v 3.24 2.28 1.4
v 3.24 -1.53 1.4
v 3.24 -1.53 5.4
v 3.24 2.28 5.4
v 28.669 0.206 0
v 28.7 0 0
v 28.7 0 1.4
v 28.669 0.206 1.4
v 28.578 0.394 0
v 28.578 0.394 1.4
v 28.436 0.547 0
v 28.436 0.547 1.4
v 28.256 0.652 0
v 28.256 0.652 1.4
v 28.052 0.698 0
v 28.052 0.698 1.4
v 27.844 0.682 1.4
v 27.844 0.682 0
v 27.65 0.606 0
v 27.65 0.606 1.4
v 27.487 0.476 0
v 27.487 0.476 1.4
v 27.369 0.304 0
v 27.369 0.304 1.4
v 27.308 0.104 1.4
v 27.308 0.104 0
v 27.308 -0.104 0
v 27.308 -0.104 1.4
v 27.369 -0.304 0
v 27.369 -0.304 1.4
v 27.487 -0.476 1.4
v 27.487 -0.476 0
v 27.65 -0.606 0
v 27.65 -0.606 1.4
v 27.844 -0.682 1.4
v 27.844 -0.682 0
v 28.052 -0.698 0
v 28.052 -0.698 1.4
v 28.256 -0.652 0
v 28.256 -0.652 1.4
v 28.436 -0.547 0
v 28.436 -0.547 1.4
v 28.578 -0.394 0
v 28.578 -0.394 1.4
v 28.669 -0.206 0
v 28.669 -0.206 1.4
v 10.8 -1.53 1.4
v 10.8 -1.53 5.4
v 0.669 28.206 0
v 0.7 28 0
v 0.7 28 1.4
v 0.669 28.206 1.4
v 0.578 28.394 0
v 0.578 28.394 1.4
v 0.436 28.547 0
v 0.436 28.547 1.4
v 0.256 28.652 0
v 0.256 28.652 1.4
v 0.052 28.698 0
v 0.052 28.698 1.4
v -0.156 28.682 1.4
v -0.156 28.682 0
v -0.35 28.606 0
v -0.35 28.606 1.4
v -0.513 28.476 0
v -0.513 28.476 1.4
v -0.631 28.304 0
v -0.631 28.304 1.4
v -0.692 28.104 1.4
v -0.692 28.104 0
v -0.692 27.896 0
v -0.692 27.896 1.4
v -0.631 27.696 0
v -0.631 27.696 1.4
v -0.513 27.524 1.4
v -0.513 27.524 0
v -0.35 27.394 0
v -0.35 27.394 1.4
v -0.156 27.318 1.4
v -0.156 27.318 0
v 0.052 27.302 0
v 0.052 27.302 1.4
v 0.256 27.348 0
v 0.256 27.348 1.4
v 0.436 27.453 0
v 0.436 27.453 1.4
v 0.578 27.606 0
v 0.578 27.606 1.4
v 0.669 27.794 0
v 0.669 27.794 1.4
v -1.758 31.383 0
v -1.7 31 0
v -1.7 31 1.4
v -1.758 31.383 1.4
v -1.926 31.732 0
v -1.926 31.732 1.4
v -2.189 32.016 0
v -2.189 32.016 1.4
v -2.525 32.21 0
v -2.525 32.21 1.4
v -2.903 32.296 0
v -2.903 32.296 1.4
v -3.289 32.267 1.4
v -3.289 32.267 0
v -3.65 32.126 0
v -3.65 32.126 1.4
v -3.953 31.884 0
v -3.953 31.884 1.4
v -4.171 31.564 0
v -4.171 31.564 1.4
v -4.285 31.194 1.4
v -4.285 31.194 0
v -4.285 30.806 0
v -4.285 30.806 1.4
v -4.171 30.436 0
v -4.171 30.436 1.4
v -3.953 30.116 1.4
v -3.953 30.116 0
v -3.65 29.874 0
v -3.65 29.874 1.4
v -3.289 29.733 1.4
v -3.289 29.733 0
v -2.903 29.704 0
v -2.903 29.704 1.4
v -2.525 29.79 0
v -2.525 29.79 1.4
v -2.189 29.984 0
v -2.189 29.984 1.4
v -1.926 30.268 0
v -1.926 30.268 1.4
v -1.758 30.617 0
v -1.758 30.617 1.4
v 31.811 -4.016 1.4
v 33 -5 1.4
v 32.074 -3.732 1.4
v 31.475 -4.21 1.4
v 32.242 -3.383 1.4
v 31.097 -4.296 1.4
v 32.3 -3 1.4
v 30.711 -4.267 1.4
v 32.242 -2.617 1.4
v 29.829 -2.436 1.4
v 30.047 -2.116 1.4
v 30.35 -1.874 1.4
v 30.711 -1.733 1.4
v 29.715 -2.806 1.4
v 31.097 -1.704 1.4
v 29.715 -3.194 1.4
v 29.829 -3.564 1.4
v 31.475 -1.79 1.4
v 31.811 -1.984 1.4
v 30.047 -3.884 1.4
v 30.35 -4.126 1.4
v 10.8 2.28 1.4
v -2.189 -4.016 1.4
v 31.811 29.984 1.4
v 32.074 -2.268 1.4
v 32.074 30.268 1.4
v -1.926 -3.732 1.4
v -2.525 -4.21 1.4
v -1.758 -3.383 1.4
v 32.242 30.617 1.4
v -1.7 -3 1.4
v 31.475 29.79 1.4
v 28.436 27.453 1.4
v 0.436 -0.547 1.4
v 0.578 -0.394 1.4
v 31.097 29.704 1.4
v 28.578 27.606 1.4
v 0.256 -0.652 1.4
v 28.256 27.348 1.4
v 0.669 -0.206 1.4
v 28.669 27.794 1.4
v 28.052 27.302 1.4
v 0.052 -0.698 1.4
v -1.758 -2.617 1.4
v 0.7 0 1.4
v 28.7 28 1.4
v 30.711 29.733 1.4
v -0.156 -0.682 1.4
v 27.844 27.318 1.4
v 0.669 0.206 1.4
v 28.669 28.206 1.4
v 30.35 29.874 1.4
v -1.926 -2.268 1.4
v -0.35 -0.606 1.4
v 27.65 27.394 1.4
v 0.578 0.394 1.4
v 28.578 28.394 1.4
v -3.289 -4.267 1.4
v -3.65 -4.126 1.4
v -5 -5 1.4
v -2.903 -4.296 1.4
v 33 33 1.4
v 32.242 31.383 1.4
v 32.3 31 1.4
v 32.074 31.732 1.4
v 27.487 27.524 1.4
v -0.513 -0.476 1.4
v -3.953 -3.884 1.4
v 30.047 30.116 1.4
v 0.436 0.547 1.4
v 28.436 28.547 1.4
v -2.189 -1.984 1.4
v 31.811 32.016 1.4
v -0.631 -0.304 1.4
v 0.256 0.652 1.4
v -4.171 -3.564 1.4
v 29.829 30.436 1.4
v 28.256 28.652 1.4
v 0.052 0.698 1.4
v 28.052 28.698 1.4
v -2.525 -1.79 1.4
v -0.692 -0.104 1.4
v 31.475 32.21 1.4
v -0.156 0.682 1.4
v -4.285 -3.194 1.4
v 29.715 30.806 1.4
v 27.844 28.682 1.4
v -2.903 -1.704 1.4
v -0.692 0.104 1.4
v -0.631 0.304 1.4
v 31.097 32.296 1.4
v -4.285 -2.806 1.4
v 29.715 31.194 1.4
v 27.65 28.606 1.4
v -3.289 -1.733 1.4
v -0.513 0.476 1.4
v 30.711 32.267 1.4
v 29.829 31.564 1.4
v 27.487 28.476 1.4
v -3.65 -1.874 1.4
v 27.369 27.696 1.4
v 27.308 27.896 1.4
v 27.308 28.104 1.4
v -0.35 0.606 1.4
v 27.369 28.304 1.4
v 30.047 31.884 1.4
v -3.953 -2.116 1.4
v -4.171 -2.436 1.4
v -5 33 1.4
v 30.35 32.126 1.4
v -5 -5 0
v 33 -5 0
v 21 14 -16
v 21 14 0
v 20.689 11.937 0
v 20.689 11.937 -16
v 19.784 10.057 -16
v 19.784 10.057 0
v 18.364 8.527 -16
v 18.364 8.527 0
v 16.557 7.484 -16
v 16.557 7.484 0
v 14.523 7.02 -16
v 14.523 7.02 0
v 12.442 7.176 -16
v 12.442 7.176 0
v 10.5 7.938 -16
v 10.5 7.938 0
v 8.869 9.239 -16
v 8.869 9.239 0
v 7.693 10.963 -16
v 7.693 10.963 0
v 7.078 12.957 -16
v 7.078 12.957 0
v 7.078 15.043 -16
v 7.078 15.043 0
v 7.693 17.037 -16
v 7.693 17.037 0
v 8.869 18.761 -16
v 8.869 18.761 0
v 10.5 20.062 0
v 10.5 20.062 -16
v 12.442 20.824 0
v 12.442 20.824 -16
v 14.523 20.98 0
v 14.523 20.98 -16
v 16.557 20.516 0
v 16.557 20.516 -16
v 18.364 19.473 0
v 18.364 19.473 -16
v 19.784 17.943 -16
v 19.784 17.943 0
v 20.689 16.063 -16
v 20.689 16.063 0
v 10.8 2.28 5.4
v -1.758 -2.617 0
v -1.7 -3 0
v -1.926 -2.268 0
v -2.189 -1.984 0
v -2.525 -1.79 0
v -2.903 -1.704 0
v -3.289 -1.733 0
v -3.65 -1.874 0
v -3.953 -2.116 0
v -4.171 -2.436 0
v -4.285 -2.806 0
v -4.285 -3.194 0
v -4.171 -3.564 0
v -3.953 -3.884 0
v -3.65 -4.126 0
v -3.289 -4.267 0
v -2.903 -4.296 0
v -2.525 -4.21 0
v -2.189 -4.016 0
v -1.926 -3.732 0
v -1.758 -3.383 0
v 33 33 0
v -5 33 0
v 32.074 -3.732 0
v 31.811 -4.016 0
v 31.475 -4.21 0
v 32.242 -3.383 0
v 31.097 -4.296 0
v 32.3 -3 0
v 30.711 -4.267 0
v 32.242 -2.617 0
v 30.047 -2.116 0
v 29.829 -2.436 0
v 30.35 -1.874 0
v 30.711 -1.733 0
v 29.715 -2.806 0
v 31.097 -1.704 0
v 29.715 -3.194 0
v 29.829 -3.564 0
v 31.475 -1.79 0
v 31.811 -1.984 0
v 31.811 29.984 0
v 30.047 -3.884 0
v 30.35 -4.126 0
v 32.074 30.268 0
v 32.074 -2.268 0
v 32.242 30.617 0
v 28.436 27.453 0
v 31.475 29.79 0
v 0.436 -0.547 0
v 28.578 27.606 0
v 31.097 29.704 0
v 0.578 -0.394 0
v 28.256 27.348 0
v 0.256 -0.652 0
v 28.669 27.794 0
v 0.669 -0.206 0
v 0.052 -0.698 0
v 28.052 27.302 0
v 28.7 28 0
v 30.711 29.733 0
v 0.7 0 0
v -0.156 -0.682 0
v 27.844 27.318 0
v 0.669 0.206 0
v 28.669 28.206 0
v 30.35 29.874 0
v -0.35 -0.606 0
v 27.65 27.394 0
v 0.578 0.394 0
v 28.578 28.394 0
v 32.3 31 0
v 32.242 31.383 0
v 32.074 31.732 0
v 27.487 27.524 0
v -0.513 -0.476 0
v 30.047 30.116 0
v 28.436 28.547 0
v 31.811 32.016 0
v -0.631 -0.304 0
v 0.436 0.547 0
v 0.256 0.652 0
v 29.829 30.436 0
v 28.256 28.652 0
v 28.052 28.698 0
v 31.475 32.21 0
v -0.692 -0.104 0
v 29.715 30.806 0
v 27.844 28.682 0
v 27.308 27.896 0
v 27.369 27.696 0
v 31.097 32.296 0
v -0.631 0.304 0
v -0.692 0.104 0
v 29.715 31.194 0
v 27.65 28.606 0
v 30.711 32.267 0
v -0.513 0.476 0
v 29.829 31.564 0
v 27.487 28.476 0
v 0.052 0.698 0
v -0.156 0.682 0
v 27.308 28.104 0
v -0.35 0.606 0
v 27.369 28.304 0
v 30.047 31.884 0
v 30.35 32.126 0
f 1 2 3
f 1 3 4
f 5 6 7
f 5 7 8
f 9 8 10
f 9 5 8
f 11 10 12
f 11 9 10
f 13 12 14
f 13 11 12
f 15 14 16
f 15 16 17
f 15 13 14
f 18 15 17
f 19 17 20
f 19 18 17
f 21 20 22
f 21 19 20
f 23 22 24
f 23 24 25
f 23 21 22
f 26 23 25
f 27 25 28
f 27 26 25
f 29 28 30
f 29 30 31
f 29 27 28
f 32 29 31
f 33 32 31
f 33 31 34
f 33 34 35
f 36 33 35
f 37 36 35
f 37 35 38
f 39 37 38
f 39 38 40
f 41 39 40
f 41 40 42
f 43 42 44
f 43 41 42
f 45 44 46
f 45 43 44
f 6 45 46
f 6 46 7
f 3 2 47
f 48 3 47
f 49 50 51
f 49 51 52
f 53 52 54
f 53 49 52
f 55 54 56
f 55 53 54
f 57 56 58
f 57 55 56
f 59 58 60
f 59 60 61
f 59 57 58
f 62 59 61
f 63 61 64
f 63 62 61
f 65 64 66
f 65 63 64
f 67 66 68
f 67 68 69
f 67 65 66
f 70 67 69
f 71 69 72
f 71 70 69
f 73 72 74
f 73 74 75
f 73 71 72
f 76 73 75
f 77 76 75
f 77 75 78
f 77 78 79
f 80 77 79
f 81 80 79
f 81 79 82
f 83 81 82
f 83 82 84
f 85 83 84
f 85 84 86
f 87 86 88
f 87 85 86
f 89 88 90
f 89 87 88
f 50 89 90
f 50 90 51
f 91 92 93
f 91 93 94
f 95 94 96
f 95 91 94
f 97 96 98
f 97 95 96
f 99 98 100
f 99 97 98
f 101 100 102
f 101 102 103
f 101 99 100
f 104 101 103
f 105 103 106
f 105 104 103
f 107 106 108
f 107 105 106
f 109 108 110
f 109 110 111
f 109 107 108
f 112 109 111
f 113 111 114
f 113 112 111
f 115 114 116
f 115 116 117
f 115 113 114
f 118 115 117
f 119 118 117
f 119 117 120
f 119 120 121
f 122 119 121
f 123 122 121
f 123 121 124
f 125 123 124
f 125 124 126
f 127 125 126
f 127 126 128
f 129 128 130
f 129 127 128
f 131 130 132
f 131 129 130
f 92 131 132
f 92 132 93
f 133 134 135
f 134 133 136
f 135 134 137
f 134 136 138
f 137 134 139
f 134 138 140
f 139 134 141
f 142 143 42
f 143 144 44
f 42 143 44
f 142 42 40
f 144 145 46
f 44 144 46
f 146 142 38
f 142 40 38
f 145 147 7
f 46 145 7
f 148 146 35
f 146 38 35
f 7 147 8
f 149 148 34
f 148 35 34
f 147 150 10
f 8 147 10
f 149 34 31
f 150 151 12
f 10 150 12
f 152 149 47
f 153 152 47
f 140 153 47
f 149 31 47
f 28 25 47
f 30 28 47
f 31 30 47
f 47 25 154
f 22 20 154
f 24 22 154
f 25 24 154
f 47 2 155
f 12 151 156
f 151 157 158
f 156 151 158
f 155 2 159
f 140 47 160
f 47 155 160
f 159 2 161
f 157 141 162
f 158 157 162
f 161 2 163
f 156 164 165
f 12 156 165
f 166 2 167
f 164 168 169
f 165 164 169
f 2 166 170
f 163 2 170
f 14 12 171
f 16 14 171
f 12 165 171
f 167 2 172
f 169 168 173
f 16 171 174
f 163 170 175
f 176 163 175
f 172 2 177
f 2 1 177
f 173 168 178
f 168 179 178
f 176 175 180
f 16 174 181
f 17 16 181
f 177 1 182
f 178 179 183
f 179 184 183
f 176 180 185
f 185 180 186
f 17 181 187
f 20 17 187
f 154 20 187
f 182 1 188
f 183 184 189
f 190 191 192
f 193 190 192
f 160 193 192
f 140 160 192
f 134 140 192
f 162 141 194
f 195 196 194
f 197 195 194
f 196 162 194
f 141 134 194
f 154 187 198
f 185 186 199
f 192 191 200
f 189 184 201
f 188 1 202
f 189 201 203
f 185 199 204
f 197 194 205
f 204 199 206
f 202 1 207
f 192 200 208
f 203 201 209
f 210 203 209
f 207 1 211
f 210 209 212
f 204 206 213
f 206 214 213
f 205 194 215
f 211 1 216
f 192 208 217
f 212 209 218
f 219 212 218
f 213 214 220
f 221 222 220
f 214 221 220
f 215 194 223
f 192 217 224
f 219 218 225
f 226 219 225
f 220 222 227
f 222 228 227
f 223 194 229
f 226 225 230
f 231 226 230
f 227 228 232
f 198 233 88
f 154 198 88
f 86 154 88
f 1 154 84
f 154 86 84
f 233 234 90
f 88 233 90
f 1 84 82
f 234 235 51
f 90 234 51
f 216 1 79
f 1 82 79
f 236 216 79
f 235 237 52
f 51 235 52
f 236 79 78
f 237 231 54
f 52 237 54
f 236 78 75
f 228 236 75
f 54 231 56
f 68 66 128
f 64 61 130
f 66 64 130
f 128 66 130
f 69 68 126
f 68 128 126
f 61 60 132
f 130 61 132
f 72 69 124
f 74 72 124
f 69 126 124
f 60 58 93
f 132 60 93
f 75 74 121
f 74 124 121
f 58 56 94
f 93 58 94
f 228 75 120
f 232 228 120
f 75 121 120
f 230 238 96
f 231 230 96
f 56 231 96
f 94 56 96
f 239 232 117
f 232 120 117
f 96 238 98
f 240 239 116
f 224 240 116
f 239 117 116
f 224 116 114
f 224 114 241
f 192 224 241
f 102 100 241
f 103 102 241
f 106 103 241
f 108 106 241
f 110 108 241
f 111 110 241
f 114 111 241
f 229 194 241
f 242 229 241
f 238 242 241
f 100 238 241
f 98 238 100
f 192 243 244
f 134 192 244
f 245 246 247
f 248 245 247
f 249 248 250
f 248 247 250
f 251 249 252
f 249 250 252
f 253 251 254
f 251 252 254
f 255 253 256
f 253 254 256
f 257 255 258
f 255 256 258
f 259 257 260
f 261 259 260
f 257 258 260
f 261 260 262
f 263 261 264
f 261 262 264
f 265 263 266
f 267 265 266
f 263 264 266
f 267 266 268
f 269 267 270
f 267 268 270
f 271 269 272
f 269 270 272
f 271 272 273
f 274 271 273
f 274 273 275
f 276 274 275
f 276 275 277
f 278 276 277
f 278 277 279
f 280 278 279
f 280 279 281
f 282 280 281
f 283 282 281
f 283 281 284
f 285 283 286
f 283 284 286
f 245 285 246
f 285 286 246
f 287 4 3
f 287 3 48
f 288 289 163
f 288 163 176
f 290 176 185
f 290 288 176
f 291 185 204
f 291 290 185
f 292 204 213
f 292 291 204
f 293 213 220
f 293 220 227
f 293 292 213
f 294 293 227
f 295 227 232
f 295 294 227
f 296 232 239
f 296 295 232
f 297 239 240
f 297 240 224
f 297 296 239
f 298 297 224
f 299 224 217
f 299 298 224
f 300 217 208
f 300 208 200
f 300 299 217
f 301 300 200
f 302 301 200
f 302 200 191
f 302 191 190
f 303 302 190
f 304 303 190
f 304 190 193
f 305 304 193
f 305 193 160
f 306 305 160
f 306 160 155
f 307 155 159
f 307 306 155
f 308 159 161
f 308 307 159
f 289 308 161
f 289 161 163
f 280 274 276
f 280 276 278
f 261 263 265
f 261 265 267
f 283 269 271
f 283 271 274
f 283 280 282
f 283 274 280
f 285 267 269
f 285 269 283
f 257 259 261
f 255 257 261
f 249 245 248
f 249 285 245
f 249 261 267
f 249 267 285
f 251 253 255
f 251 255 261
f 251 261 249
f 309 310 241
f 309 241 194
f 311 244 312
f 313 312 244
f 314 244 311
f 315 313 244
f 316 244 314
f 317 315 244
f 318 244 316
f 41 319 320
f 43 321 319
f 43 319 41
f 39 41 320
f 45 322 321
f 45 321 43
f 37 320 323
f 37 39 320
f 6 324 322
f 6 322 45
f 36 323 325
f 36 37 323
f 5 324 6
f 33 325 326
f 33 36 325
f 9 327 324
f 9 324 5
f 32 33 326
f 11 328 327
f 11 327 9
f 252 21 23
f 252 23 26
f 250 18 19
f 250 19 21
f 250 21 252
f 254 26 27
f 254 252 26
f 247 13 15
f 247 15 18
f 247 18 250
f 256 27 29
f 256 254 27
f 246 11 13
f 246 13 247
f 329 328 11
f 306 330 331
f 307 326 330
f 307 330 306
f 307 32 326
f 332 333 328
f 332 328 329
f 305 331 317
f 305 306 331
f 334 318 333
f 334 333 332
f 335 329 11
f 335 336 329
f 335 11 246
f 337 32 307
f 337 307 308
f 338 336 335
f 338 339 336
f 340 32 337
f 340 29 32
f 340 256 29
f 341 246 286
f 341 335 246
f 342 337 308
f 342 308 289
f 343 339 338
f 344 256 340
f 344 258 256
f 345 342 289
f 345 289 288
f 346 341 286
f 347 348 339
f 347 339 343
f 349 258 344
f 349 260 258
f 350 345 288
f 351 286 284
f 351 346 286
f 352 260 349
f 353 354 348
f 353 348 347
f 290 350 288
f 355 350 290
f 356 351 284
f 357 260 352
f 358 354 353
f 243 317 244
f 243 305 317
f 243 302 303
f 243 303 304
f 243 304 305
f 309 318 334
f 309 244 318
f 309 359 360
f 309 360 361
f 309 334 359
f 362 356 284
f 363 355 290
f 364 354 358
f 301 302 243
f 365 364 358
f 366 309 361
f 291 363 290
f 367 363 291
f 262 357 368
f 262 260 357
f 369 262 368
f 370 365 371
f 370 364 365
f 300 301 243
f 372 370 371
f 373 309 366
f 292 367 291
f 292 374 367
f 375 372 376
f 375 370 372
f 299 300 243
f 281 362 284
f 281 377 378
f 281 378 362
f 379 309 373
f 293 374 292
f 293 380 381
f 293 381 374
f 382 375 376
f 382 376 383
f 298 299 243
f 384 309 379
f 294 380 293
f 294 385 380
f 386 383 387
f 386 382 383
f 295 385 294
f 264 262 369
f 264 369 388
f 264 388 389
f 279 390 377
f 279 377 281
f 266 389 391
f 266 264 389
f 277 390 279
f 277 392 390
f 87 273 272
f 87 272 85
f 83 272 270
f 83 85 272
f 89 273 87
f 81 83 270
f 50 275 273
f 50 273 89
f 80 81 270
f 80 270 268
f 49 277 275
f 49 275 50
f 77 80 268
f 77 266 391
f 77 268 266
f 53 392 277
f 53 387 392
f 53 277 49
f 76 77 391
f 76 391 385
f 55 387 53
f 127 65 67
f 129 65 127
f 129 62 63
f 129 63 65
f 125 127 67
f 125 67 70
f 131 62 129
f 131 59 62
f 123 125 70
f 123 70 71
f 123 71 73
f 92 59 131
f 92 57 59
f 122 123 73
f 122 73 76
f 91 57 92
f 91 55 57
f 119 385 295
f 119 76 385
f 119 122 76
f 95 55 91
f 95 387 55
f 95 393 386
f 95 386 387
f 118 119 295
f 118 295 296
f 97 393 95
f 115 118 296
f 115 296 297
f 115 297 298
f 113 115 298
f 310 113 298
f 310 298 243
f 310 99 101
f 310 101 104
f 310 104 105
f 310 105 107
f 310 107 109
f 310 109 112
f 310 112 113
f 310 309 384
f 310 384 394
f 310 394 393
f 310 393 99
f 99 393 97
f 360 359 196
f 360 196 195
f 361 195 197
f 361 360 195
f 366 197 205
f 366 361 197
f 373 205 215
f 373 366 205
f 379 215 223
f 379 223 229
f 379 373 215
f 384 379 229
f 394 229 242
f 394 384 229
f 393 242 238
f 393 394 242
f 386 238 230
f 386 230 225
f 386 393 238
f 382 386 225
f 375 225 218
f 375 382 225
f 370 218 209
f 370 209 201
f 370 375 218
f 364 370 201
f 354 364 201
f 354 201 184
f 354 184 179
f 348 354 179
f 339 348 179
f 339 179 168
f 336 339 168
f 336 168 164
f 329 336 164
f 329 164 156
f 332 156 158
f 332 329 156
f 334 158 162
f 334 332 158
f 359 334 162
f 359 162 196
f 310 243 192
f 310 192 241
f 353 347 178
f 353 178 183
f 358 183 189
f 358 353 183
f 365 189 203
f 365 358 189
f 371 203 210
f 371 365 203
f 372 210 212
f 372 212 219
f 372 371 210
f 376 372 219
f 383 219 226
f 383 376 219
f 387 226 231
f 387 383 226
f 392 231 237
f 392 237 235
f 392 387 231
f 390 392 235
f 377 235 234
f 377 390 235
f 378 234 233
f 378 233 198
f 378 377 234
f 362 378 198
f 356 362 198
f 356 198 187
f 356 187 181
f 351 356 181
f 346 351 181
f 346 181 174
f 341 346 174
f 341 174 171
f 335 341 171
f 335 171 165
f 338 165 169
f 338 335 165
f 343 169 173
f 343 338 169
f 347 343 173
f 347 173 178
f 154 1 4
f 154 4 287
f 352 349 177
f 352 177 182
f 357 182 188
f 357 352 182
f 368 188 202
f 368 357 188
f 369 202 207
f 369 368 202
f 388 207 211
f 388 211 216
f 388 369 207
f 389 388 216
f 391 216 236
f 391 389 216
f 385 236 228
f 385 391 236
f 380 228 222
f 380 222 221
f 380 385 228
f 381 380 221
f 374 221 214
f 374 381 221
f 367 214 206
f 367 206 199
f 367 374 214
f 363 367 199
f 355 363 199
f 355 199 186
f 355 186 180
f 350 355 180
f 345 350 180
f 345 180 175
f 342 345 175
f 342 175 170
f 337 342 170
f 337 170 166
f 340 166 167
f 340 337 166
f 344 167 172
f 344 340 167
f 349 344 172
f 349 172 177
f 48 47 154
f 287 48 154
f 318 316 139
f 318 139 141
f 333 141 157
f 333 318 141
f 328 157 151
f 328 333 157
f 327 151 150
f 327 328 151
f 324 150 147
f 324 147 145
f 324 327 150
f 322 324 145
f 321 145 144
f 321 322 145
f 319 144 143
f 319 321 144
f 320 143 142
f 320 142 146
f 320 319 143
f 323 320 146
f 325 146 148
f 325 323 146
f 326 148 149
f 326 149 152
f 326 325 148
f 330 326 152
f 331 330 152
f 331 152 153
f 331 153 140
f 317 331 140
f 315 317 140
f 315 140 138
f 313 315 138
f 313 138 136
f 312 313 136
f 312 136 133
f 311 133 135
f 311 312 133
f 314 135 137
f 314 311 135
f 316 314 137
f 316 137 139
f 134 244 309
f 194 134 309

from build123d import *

# Parameters (mm, degrees)
SKETCH1_W           = 38
SKETCH1_H           = 38
SKETCH1_R           = 1.3
SKETCH1_R_2         = 0.7
BOSS_EXTRUDE1_DEPTH = 1.4
SKETCH2_W           = 7.56
SKETCH2_H           = 3.81
BOSS_EXTRUDE2_DEPTH = 4
SKETCH3_R           = 7
BOSS_EXTRUDE3_DEPTH = 16


with BuildPart() as part:
    # Sketch1 → Boss-Extrude1 (new body)
    # profile 1 of 2: a face of its own
    with BuildSketch(Plane.XY):
        with Locations((14, 14)):
            Rectangle(SKETCH1_W, SKETCH1_H)
        with Locations((-3, -3)):
            Circle(SKETCH1_R, mode=Mode.SUBTRACT)
        with Locations((31, -3)):
            Circle(SKETCH1_R, mode=Mode.SUBTRACT)
        with Locations((31, 31)):
            Circle(SKETCH1_R, mode=Mode.SUBTRACT)
        with Locations((-3, 31)):
            Circle(SKETCH1_R, mode=Mode.SUBTRACT)
        with BuildLine():
            ThreePointArc((0.1, 29.3), (-0.889949494, 28.889949494), (-1.3, 27.9))
            Line((-1.3, 27.9), (-1.3, 0.1))
            ThreePointArc((-1.3, 0.1), (-0.889949494, -0.889949494), (0.1, -1.3))
            Line((0.1, -1.3), (27.9, -1.3))
            ThreePointArc((27.9, -1.3), (28.889949494, -0.889949494), (29.3, 0.1))
            Line((29.3, 0.1), (29.3, 27.9))
            ThreePointArc((29.3, 27.9), (28.889949494, 28.889949494), (27.9, 29.3))
            Line((27.9, 29.3), (0.1, 29.3))
        make_face(mode=Mode.SUBTRACT)
    # profile 2 of 2: a face of its own
    with BuildSketch(Plane.XY):
        with BuildLine():
            Line((0.1, 29.3), (27.9, 29.3))
            ThreePointArc((27.9, 29.3), (28.889949494, 28.889949494), (29.3, 27.9))
            Line((29.3, 27.9), (29.3, 0.1))
            ThreePointArc((29.3, 0.1), (28.889949494, -0.889949494), (27.9, -1.3))
            Line((27.9, -1.3), (0.1, -1.3))
            ThreePointArc((0.1, -1.3), (-0.889949494, -0.889949494), (-1.3, 0.1))
            Line((-1.3, 0.1), (-1.3, 27.9))
            ThreePointArc((-1.3, 27.9), (-0.889949494, 28.889949494), (0.1, 29.3))
        make_face()
        with Locations((0, 28)):
            Circle(SKETCH1_R_2, mode=Mode.SUBTRACT)
        with Locations((28, 28)):
            Circle(SKETCH1_R_2, mode=Mode.SUBTRACT)
        Circle(SKETCH1_R_2, mode=Mode.SUBTRACT)
        with Locations((28, 0)):
            Circle(SKETCH1_R_2, mode=Mode.SUBTRACT)
    extrude(amount=BOSS_EXTRUDE1_DEPTH)

    # Sketch2 → Boss-Extrude2 (add)
    with BuildSketch(Plane.XY.offset(1.4)):
        with Locations((7.02, 0.375)):
            Rectangle(SKETCH2_W, SKETCH2_H)
    extrude(amount=BOSS_EXTRUDE2_DEPTH)

    # Sketch3 → Boss-Extrude3 (add)
    with BuildSketch(Plane(origin=(0, 0, 0), x_dir=(-1, 0, 0), z_dir=(0, 0, -1))):
        with Locations(Location((-14, 14, 0), (0, 0, 180))):
            Circle(SKETCH3_R)
    extrude(amount=BOSS_EXTRUDE3_DEPTH)


solid = part.part
